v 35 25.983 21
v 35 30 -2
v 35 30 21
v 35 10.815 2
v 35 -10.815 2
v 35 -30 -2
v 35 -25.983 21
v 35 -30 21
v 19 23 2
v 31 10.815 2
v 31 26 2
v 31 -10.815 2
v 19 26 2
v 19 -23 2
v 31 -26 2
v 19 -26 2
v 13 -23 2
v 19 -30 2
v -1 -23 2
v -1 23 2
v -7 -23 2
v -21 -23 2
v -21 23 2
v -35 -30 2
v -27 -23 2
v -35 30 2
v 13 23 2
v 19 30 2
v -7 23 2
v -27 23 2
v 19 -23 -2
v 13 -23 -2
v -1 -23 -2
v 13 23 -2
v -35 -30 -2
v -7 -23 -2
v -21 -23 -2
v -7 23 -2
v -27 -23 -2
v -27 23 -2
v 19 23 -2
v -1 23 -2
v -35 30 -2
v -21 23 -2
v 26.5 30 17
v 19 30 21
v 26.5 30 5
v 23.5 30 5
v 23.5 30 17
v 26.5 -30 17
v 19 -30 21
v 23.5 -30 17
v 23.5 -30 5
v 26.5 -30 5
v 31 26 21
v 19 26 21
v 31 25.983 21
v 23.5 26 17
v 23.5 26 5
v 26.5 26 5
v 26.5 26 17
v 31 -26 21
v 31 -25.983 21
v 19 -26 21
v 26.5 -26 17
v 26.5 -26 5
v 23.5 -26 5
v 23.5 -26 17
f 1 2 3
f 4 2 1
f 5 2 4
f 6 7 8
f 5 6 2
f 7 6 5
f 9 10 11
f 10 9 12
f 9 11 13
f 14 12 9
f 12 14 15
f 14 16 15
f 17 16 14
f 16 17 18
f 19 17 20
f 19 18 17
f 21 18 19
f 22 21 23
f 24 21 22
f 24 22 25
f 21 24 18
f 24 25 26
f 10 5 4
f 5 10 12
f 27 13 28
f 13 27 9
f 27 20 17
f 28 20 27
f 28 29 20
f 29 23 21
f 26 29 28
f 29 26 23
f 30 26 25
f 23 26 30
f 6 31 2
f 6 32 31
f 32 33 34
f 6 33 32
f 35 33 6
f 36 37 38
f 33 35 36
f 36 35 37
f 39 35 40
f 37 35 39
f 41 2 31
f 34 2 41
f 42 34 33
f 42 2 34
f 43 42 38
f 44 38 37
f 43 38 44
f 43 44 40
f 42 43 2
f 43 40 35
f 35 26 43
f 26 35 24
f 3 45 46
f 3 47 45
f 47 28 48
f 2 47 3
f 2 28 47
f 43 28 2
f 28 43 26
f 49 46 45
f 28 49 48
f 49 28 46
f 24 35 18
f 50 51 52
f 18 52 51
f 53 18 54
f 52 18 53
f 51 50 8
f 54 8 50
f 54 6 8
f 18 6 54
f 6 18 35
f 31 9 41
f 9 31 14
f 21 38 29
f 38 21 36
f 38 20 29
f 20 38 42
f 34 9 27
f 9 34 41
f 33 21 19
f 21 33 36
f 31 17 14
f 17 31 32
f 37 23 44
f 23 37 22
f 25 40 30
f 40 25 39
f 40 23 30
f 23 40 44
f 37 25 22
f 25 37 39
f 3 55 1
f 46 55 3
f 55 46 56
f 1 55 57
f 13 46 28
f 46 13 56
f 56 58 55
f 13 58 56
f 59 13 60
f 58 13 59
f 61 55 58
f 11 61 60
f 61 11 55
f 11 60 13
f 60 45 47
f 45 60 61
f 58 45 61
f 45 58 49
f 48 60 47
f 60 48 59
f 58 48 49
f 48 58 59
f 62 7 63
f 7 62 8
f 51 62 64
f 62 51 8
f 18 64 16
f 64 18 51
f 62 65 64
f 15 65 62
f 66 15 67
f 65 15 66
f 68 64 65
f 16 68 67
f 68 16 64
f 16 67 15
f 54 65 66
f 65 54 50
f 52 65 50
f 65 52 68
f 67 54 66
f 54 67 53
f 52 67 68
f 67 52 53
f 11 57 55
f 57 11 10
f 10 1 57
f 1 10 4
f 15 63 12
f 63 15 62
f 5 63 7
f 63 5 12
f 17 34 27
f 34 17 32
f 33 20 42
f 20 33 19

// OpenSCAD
difference(){
	cube([70,60,4],center = true);
	translate([6,0,0])
	cube([26,46,10], center = true);
	translate([-24,0,0])
	cube([6,46,10], center = true);
}
translate([6,0,0])
cube([14,46,4], center = true);

translate([27,28,11]){
	difference(){
	cube([16,4,20],center = true);
	translate([-2,0,0])
	cube([3,10,12],center = true);
	}
}

translate([27,-28,11]){
	difference(){
	cube([16,4,20],center = true);
	translate([-2,0,0])
	cube([3,10,12],center = true);
	}
}

translate([33,18,11]){
	rotate([0,0,90])
	difference(){
	cube([16,4,20],center = true);
	rotate([0,-51.4,0])
	translate([0,0,10])
	cube([30,10,20],center = true);
	}
}

translate([33,-18,11]){
	rotate([0,0,-90])
	difference(){
	cube([16,4,20],center = true);
	rotate([0,-51.4,0])
	translate([0,0,10])
	cube([30,10,20],center = true);
	}
}
